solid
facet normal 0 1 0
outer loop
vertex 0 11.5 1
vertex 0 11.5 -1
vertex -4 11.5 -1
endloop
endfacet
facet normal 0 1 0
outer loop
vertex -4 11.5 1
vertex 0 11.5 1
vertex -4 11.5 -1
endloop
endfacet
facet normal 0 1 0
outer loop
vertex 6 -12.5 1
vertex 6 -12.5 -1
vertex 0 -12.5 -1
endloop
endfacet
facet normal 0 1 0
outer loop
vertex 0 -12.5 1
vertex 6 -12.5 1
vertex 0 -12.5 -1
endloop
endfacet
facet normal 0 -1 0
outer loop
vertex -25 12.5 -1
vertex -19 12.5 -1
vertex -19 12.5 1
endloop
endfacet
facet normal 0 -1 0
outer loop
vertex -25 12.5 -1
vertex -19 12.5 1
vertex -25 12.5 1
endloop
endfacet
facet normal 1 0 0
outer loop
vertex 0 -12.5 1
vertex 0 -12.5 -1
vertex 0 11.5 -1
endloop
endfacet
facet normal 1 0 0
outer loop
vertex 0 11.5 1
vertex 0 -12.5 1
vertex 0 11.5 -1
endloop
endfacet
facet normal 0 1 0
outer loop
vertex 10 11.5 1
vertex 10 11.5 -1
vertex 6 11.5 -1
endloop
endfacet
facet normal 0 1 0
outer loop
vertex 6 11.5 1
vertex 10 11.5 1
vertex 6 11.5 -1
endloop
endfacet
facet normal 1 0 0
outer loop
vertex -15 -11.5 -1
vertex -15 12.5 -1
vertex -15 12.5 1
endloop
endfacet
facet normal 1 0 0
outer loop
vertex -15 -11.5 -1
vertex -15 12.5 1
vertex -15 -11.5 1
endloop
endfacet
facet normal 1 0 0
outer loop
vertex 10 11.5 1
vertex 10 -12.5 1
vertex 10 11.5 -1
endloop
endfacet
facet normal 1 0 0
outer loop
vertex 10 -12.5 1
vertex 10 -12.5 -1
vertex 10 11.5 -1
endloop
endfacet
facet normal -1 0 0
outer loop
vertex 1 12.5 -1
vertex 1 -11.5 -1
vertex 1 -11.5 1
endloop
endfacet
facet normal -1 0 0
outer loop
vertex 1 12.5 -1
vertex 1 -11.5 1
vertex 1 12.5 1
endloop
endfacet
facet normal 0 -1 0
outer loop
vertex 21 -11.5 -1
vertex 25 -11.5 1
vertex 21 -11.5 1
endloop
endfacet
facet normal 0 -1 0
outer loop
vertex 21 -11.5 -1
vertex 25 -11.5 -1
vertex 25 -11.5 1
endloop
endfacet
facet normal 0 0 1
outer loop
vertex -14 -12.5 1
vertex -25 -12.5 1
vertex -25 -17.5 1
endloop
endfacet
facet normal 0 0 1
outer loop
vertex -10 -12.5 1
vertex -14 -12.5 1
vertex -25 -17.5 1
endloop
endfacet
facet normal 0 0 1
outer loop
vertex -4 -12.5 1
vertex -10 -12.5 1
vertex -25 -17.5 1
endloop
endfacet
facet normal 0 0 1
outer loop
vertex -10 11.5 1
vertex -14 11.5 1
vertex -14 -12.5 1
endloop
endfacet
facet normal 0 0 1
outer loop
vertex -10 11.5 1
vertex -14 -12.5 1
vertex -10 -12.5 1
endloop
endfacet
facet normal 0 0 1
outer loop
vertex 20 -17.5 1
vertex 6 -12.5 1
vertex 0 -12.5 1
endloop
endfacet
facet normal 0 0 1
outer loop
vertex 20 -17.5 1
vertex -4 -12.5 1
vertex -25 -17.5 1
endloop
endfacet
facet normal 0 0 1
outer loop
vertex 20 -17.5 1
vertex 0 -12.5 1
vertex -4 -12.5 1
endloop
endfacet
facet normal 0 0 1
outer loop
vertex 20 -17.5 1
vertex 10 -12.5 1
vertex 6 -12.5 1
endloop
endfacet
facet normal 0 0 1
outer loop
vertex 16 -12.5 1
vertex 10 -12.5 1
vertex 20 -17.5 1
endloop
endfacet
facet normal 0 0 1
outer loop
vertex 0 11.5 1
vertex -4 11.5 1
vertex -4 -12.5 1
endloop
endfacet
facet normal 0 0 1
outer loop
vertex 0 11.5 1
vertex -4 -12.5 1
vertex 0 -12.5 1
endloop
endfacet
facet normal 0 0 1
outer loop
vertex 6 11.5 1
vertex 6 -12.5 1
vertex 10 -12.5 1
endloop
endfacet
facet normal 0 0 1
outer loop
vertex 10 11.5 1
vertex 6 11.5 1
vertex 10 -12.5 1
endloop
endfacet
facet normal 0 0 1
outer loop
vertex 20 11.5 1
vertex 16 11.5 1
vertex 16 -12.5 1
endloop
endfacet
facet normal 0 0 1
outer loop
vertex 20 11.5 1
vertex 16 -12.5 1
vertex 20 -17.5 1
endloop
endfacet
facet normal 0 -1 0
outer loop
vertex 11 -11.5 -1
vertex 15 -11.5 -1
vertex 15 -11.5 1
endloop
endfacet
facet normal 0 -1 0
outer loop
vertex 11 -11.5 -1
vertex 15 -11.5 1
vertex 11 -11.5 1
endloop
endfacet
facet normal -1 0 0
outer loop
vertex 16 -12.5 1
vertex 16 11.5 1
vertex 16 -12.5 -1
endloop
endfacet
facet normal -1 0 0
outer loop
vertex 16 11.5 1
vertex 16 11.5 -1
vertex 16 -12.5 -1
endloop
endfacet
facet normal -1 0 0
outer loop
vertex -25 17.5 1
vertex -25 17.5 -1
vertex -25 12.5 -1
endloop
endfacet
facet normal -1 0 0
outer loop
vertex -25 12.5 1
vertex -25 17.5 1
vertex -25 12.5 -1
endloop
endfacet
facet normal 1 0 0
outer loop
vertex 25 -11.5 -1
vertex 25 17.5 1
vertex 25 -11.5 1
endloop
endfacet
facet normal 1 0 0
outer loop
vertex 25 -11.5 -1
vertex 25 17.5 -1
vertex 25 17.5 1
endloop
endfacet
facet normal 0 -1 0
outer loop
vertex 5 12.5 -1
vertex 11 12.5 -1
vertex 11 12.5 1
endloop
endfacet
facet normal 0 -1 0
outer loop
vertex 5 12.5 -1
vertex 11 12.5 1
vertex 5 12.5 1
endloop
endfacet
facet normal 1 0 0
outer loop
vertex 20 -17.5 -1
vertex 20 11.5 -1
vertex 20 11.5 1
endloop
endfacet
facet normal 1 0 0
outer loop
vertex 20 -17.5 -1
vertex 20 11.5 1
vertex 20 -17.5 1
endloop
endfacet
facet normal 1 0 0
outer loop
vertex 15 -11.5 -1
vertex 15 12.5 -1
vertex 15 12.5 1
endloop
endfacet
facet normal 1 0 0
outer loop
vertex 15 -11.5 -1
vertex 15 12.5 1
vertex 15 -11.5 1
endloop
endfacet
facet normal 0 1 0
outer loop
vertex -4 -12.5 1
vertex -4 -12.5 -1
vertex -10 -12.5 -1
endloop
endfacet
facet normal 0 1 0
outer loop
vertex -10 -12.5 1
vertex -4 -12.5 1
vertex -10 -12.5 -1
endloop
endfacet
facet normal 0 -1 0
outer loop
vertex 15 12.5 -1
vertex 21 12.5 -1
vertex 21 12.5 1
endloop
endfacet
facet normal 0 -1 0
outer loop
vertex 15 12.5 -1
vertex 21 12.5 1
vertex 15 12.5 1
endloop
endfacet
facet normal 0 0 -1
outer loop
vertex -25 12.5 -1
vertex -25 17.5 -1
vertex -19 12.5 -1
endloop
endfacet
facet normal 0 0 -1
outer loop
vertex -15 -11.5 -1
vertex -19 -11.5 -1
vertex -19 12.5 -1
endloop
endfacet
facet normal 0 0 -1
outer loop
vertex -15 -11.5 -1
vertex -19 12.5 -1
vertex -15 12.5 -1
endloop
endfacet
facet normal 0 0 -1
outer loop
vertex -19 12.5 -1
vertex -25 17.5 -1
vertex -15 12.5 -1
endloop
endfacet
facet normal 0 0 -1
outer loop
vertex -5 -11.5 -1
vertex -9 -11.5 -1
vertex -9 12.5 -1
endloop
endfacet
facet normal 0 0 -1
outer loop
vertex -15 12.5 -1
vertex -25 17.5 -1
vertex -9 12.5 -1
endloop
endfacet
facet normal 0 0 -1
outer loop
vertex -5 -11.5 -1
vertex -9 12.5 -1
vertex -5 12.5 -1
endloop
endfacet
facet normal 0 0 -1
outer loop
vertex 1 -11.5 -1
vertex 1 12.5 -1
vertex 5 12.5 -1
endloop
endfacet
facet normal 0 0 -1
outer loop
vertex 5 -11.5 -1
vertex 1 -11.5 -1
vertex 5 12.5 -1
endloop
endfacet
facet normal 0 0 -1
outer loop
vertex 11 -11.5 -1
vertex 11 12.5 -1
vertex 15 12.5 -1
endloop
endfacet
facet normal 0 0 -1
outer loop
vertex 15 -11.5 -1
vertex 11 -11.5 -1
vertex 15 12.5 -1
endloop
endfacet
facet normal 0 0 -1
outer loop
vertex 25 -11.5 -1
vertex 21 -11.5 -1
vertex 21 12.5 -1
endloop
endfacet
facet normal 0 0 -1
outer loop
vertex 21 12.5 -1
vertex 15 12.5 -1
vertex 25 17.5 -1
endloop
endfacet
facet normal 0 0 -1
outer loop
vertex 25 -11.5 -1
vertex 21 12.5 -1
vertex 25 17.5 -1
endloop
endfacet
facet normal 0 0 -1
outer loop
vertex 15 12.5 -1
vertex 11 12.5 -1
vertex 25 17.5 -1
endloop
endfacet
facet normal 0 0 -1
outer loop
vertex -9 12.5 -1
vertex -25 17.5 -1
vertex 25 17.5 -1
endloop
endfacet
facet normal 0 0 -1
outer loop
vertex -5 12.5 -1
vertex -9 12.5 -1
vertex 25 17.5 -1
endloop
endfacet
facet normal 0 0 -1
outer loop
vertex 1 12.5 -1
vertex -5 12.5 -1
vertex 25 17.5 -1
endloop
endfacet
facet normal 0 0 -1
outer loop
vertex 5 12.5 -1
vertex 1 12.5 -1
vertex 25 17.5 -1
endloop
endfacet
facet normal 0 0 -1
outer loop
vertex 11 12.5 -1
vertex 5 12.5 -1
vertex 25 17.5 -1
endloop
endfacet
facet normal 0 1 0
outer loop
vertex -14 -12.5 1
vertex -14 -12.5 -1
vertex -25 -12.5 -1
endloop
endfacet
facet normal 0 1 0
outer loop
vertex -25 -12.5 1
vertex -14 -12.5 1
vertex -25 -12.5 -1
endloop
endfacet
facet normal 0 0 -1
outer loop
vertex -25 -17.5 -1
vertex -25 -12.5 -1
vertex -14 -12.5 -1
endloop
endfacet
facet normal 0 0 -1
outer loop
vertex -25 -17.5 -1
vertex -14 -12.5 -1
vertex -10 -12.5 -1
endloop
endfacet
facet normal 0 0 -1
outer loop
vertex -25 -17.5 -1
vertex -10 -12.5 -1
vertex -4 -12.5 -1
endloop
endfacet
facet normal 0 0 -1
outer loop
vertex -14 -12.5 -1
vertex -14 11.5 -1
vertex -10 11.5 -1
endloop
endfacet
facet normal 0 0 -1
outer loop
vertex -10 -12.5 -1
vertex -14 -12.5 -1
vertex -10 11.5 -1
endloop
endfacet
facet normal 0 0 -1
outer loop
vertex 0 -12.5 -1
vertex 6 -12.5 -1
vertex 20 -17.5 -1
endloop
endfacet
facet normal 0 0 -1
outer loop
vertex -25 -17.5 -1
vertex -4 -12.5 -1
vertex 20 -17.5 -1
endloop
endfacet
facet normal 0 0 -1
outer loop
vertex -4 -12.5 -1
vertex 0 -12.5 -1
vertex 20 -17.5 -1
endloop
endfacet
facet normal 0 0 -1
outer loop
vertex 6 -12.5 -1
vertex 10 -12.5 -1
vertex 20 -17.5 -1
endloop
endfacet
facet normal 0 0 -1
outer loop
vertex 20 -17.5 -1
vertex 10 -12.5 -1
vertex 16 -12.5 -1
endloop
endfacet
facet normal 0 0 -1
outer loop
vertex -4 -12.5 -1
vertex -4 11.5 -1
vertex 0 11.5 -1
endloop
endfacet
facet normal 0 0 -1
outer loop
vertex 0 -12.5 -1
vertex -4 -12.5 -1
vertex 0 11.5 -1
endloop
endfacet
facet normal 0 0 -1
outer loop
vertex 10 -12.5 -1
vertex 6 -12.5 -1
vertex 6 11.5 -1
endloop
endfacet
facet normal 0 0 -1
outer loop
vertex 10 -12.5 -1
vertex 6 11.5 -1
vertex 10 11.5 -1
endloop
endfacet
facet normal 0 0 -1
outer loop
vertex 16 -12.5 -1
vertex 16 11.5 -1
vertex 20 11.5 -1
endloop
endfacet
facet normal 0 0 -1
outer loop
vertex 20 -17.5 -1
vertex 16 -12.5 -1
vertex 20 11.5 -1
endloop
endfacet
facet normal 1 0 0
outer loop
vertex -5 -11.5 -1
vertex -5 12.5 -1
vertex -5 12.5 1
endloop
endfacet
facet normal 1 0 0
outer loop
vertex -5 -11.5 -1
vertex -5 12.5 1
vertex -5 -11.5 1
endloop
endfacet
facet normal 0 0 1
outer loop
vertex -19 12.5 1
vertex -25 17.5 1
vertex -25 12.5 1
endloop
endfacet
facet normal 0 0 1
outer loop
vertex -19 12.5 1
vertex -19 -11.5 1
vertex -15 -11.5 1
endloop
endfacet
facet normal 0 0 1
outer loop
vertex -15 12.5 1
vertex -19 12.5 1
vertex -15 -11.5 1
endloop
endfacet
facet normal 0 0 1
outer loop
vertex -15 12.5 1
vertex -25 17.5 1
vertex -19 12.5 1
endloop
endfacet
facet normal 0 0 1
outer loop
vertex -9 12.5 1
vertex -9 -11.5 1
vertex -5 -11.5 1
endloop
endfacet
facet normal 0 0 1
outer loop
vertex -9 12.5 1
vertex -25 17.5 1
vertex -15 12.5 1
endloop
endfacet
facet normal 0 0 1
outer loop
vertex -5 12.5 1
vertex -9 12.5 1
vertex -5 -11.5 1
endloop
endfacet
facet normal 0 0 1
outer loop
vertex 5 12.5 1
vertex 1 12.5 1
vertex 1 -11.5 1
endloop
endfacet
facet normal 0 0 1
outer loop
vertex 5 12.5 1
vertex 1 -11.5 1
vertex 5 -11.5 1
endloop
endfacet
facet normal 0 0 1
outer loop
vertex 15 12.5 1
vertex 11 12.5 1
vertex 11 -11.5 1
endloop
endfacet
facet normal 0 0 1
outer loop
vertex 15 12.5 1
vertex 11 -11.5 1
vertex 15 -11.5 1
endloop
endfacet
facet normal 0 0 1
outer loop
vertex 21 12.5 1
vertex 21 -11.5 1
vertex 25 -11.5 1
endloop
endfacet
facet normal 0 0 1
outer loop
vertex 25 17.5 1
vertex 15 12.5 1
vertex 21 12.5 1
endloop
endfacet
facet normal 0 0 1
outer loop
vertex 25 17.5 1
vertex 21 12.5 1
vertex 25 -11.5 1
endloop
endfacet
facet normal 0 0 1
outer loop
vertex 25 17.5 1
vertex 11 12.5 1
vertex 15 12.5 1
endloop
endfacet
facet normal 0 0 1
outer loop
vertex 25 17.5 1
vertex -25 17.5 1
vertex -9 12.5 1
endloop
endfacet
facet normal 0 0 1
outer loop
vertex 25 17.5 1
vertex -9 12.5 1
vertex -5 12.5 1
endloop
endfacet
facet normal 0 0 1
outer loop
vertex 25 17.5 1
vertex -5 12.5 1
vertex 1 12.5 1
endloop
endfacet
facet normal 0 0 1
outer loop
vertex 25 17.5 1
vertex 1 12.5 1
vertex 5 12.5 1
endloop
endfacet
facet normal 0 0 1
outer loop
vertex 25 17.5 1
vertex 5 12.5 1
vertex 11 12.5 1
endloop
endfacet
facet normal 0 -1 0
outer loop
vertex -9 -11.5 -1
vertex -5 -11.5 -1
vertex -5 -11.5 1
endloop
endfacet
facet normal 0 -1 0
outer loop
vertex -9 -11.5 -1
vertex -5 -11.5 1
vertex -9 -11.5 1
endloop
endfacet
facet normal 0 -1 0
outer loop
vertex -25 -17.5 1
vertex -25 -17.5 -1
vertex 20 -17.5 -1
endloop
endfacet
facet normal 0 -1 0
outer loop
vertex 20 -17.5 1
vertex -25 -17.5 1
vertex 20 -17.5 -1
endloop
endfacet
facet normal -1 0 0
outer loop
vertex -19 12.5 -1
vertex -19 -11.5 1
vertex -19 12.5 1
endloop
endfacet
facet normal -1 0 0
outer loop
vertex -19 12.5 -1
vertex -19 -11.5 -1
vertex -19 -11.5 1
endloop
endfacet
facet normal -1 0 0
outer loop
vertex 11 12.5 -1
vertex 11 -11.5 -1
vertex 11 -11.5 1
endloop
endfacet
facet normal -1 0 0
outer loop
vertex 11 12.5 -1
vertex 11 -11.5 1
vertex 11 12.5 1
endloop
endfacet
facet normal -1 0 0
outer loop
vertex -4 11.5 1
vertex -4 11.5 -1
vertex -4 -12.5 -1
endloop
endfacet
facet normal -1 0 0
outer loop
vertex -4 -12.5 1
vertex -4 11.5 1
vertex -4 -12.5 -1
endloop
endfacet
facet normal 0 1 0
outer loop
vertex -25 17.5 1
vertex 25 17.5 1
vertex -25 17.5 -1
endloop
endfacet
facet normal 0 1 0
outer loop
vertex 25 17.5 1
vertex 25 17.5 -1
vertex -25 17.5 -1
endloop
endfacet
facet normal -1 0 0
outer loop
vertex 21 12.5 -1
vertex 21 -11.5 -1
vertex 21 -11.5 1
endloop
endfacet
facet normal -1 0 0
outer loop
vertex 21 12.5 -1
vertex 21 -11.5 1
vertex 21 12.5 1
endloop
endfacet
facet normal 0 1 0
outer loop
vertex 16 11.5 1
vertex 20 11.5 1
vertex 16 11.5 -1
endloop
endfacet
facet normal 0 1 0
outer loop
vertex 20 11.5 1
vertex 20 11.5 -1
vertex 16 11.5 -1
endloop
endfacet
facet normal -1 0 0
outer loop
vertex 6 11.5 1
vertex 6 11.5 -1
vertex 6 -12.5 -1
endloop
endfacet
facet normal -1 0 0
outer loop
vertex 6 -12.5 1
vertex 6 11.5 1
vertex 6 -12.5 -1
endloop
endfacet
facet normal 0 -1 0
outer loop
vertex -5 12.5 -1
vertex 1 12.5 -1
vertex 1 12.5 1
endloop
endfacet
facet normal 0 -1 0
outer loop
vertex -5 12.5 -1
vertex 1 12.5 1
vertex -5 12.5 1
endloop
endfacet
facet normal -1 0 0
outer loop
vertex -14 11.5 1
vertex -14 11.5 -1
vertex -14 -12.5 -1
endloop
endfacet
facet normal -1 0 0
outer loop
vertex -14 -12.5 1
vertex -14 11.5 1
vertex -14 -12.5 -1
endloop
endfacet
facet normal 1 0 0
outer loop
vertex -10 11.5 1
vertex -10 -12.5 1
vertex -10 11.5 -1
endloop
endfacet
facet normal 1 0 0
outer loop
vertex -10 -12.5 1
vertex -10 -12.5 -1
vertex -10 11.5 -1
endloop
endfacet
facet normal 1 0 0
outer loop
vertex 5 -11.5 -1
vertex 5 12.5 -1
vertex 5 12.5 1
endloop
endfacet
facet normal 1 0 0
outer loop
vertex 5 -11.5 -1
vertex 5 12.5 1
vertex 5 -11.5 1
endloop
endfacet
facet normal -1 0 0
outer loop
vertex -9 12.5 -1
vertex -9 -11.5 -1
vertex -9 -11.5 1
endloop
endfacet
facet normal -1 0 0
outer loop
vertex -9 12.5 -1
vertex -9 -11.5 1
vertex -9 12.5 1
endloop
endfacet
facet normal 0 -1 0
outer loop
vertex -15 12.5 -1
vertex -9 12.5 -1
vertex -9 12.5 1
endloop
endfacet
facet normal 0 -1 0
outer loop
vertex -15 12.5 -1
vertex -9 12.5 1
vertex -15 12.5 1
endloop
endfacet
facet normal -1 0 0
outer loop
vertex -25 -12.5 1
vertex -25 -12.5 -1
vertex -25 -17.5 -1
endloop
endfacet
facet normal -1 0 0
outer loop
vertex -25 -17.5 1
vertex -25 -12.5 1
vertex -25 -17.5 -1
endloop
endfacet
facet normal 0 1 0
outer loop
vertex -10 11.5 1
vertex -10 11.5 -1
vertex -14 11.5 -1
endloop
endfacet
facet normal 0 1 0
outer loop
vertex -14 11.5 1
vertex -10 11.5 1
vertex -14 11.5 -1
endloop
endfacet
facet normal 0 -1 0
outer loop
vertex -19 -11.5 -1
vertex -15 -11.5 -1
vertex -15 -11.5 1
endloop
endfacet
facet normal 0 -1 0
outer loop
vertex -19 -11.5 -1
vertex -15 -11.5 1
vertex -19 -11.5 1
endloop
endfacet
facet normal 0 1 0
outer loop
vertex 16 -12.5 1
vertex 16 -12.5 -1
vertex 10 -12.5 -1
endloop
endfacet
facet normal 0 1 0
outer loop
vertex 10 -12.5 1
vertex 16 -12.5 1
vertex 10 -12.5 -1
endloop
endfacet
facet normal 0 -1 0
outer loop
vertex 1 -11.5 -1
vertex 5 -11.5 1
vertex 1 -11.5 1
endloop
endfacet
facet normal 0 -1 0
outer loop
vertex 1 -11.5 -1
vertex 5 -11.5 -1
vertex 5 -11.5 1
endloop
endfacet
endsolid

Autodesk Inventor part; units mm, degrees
ref_plane "YZ Plane" through (0, 0, 0) normal (1, 0, 0) x (0, 1, 0)
ref_plane "XZ Plane" through (0, 0, 0) normal (0, 1, 0) x (-1, 0, 0)
ref_plane "XY Plane" through (0, 0, 0) normal (0, 0, 1) x (1, 0, 0)
sketch "Sketch2" plane through (0, 0, 0) normal (0, 0, 1) x (1, 0, 0)
  line L0 (-25, -17.5) -> (25, -17.5) construction
  line L1 (25, -17.5) -> (25, 17.5) construction
  line L2 (25, 17.5) -> (-25, 17.5)
  line L3 (-25, 17.5) -> (-25, -17.5) construction
  line L4 (-25, -17.5) -> (25, 17.5) construction
  line L5 (25, -17.5) -> (-25, 17.5) construction
  line L6 (-25, 17.5) -> (-25, 12.5)
  line L7 (25, 17.5) -> (25, -11.5)
  line L8 (25, -11.5) -> (21, -11.5)
  line L9 (21, -11.5) -> (21, 12.5)
  line L10 (21, 12.5) -> (15, 12.5)
  line L11 (15, 12.5) -> (15, -11.5)
  line L12 (15, -11.5) -> (11, -11.5)
  line L13 (11, -11.5) -> (11, 12.5)
  line L14 (11, 12.5) -> (5, 12.5)
  line L15 (5, 12.5) -> (5, -11.5)
  line L16 (5, -11.5) -> (1, -11.5)
  line L17 (1, -11.5) -> (1, 12.5)
  line L18 (1, 12.5) -> (-5, 12.5)
  line L19 (-5, 12.5) -> (-5, -11.5)
  line L20 (-5, -11.5) -> (-9, -11.5)
  line L21 (-9, -11.5) -> (-9, 12.5)
  line L22 (-9, 12.5) -> (-15, 12.5)
  line L23 (-15, 12.5) -> (-15, -11.5)
  line L24 (-15, -11.5) -> (-19, -11.5)
  line L25 (-19, -11.5) -> (-19, 12.5)
  line L26 (-19, 12.5) -> (-25, 12.5)
  line L27 (-25, -17.5) -> (20, -17.5)
  line L28 (20, 11.5) -> (20, -17.5)
  line L29 (20, 11.5) -> (16, 11.5)
  line L30 (16, 11.5) -> (16, -12.5)
  line L31 (16, -12.5) -> (10, -12.5)
  line L32 (10, -12.5) -> (10, 11.5)
  line L33 (10, 11.5) -> (6, 11.5)
  line L34 (6, 11.5) -> (6, -12.5)
  line L35 (6, -12.5) -> (0, -12.5)
  line L36 (0, -12.5) -> (0, 11.5)
  line L37 (0, 11.5) -> (-4, 11.5)
  line L38 (-4, 11.5) -> (-4, -12.5)
  line L39 (-4, -12.5) -> (-10, -12.5)
  line L40 (-10, -12.5) -> (-10, 11.5)
  line L41 (-10, 11.5) -> (-14, 11.5)
  line L42 (-14, 11.5) -> (-14, -12.5)
  line L43 (-14, -12.5) -> (-25, -12.5)
  line L44 (-25, -12.5) -> (-25, -17.5)
  point P0 (0, 0)
  dimension "d17" = 50
  dimension "d18" = 35
  dimension "d19" = 5
  dimension "d21" = 4
  dimension "d22" = 6
  dimension "d23" = 1
  dimension "d24" = 1
  dimension "d25" = 1
  dimension "d26" = 1
  dimension "d27" = 5
extrude "Extrusion2" add sketch "Sketch2" along normal mid plane 2
sketch "Sketch1" plane through (0, 0, 0) normal (0, 0, 1) x (1, 0, 0)
  line L0 (-60, 75) -> (60, 75)
  line L1 (60, 75) -> (60, -75) construction
  line L2 (60, -75) -> (-60, -75) construction
  line L3 (-60, -75) -> (-60, 75) construction
  line L4 (-60, 75) -> (-60, 65)
  line L5 (-60, 65) -> (-30, 65)
  line L6 (-30, 65) -> (-30, -55)
  line L7 (-30, -55) -> (-21.7778, -55)
  line L8 (-21.7778, -55) -> (-21.7778, 65)
  line L9 (-21.7778, 65) -> (-9.5556, 65)
  line L10 (-9.5556, 65) -> (-9.5556, -55)
  line L11 (-9.5556, -55) -> (-1.3333, -55)
  line L12 (-1.3333, -55) -> (-1.3333, 65)
  line L13 (-1.3333, 65) -> (10.8889, 65)
  line L14 (10.8889, 65) -> (10.8889, -55)
  line L15 (10.8889, -55) -> (19.1111, -55)
  line L16 (19.1111, -55) -> (19.1111, 65)
  line L17 (19.1111, 65) -> (31.3333, 65)
  line L18 (31.3333, 65) -> (31.3333, -55)
  line L19 (31.3333, -55) -> (39.5556, -55)
  line L20 (39.5556, -55) -> (39.5556, 65)
  line L21 (39.5556, 65) -> (51.7778, 65)
  line L22 (60, 75) -> (60, -55)
  line L23 (51.7778, 65) -> (51.7778, -55)
  line L24 (51.7778, -55) -> (60, -55)
  line L25 (-60, -75) -> (-60, -65)
  line L26 (-60, -65) -> (-19.7778, -65)
  line L27 (-60, -75) -> (49.7778, -75)
  line L28 (-19.7778, -65) -> (-19.7778, 63)
  line L29 (-19.7778, 63) -> (-11.5556, 63)
  line L30 (-11.5556, 63) -> (-11.5556, -65)
  line L31 (-11.5556, -65) -> (0.6667, -65)
  line L32 (0.6667, -65) -> (0.6667, 63)
  line L33 (0.6667, 63) -> (8.8889, 63)
  line L34 (8.8889, 63) -> (8.8889, -65)
  line L35 (8.8889, -65) -> (21.1111, -65)
  line L36 (21.1111, -65) -> (21.1111, 63)
  line L37 (21.1111, 63) -> (29.3333, 63)
  line L38 (29.3333, 63) -> (29.3333, -65)
  line L39 (29.3333, -65) -> (41.5556, -65)
  line L40 (41.5556, -65) -> (41.5556, 63)
  line L41 (41.5556, 63) -> (49.7778, 63)
  line L42 (49.7778, 63) -> (49.7778, -75)
  point P0 (0, 0)
  point P1 (0, 75)
  point P2 (-60, 0)
  point P3 (-15.6667, 63)
  point P4 (-15.6667, 65)
  point P5 (-5.4444, -55)
  point P6 (-5.4444, -65)
  point P7 (45.6667, 63)
  point P8 (45.6667, 65)
  point P9 (4.7778, 63)
  point P10 (4.7778, 65)
  point P11 (25.2222, 63)
  point P12 (25.2222, 65)
  point P13 (15, -55)
  point P14 (15, -65)
  point P15 (35.4444, -55)
  point P16 (35.4444, -65)
  dimension "d5" = 150
  dimension "d7" = 10
  dimension "d9" = 120
  dimension "d11" = 2
  dimension "d12" = 2
  dimension "d13" = 120
  dimension "d14" = 30
equation "\"d24\" = d23"
equation "\"d25\" = d23"
equation "\"d26\" = d23"
equation "\"d27\" = d19"
equation "\"d12\" = d11"
properties part number "sensor-0001-001" material "Iron, Cast"
